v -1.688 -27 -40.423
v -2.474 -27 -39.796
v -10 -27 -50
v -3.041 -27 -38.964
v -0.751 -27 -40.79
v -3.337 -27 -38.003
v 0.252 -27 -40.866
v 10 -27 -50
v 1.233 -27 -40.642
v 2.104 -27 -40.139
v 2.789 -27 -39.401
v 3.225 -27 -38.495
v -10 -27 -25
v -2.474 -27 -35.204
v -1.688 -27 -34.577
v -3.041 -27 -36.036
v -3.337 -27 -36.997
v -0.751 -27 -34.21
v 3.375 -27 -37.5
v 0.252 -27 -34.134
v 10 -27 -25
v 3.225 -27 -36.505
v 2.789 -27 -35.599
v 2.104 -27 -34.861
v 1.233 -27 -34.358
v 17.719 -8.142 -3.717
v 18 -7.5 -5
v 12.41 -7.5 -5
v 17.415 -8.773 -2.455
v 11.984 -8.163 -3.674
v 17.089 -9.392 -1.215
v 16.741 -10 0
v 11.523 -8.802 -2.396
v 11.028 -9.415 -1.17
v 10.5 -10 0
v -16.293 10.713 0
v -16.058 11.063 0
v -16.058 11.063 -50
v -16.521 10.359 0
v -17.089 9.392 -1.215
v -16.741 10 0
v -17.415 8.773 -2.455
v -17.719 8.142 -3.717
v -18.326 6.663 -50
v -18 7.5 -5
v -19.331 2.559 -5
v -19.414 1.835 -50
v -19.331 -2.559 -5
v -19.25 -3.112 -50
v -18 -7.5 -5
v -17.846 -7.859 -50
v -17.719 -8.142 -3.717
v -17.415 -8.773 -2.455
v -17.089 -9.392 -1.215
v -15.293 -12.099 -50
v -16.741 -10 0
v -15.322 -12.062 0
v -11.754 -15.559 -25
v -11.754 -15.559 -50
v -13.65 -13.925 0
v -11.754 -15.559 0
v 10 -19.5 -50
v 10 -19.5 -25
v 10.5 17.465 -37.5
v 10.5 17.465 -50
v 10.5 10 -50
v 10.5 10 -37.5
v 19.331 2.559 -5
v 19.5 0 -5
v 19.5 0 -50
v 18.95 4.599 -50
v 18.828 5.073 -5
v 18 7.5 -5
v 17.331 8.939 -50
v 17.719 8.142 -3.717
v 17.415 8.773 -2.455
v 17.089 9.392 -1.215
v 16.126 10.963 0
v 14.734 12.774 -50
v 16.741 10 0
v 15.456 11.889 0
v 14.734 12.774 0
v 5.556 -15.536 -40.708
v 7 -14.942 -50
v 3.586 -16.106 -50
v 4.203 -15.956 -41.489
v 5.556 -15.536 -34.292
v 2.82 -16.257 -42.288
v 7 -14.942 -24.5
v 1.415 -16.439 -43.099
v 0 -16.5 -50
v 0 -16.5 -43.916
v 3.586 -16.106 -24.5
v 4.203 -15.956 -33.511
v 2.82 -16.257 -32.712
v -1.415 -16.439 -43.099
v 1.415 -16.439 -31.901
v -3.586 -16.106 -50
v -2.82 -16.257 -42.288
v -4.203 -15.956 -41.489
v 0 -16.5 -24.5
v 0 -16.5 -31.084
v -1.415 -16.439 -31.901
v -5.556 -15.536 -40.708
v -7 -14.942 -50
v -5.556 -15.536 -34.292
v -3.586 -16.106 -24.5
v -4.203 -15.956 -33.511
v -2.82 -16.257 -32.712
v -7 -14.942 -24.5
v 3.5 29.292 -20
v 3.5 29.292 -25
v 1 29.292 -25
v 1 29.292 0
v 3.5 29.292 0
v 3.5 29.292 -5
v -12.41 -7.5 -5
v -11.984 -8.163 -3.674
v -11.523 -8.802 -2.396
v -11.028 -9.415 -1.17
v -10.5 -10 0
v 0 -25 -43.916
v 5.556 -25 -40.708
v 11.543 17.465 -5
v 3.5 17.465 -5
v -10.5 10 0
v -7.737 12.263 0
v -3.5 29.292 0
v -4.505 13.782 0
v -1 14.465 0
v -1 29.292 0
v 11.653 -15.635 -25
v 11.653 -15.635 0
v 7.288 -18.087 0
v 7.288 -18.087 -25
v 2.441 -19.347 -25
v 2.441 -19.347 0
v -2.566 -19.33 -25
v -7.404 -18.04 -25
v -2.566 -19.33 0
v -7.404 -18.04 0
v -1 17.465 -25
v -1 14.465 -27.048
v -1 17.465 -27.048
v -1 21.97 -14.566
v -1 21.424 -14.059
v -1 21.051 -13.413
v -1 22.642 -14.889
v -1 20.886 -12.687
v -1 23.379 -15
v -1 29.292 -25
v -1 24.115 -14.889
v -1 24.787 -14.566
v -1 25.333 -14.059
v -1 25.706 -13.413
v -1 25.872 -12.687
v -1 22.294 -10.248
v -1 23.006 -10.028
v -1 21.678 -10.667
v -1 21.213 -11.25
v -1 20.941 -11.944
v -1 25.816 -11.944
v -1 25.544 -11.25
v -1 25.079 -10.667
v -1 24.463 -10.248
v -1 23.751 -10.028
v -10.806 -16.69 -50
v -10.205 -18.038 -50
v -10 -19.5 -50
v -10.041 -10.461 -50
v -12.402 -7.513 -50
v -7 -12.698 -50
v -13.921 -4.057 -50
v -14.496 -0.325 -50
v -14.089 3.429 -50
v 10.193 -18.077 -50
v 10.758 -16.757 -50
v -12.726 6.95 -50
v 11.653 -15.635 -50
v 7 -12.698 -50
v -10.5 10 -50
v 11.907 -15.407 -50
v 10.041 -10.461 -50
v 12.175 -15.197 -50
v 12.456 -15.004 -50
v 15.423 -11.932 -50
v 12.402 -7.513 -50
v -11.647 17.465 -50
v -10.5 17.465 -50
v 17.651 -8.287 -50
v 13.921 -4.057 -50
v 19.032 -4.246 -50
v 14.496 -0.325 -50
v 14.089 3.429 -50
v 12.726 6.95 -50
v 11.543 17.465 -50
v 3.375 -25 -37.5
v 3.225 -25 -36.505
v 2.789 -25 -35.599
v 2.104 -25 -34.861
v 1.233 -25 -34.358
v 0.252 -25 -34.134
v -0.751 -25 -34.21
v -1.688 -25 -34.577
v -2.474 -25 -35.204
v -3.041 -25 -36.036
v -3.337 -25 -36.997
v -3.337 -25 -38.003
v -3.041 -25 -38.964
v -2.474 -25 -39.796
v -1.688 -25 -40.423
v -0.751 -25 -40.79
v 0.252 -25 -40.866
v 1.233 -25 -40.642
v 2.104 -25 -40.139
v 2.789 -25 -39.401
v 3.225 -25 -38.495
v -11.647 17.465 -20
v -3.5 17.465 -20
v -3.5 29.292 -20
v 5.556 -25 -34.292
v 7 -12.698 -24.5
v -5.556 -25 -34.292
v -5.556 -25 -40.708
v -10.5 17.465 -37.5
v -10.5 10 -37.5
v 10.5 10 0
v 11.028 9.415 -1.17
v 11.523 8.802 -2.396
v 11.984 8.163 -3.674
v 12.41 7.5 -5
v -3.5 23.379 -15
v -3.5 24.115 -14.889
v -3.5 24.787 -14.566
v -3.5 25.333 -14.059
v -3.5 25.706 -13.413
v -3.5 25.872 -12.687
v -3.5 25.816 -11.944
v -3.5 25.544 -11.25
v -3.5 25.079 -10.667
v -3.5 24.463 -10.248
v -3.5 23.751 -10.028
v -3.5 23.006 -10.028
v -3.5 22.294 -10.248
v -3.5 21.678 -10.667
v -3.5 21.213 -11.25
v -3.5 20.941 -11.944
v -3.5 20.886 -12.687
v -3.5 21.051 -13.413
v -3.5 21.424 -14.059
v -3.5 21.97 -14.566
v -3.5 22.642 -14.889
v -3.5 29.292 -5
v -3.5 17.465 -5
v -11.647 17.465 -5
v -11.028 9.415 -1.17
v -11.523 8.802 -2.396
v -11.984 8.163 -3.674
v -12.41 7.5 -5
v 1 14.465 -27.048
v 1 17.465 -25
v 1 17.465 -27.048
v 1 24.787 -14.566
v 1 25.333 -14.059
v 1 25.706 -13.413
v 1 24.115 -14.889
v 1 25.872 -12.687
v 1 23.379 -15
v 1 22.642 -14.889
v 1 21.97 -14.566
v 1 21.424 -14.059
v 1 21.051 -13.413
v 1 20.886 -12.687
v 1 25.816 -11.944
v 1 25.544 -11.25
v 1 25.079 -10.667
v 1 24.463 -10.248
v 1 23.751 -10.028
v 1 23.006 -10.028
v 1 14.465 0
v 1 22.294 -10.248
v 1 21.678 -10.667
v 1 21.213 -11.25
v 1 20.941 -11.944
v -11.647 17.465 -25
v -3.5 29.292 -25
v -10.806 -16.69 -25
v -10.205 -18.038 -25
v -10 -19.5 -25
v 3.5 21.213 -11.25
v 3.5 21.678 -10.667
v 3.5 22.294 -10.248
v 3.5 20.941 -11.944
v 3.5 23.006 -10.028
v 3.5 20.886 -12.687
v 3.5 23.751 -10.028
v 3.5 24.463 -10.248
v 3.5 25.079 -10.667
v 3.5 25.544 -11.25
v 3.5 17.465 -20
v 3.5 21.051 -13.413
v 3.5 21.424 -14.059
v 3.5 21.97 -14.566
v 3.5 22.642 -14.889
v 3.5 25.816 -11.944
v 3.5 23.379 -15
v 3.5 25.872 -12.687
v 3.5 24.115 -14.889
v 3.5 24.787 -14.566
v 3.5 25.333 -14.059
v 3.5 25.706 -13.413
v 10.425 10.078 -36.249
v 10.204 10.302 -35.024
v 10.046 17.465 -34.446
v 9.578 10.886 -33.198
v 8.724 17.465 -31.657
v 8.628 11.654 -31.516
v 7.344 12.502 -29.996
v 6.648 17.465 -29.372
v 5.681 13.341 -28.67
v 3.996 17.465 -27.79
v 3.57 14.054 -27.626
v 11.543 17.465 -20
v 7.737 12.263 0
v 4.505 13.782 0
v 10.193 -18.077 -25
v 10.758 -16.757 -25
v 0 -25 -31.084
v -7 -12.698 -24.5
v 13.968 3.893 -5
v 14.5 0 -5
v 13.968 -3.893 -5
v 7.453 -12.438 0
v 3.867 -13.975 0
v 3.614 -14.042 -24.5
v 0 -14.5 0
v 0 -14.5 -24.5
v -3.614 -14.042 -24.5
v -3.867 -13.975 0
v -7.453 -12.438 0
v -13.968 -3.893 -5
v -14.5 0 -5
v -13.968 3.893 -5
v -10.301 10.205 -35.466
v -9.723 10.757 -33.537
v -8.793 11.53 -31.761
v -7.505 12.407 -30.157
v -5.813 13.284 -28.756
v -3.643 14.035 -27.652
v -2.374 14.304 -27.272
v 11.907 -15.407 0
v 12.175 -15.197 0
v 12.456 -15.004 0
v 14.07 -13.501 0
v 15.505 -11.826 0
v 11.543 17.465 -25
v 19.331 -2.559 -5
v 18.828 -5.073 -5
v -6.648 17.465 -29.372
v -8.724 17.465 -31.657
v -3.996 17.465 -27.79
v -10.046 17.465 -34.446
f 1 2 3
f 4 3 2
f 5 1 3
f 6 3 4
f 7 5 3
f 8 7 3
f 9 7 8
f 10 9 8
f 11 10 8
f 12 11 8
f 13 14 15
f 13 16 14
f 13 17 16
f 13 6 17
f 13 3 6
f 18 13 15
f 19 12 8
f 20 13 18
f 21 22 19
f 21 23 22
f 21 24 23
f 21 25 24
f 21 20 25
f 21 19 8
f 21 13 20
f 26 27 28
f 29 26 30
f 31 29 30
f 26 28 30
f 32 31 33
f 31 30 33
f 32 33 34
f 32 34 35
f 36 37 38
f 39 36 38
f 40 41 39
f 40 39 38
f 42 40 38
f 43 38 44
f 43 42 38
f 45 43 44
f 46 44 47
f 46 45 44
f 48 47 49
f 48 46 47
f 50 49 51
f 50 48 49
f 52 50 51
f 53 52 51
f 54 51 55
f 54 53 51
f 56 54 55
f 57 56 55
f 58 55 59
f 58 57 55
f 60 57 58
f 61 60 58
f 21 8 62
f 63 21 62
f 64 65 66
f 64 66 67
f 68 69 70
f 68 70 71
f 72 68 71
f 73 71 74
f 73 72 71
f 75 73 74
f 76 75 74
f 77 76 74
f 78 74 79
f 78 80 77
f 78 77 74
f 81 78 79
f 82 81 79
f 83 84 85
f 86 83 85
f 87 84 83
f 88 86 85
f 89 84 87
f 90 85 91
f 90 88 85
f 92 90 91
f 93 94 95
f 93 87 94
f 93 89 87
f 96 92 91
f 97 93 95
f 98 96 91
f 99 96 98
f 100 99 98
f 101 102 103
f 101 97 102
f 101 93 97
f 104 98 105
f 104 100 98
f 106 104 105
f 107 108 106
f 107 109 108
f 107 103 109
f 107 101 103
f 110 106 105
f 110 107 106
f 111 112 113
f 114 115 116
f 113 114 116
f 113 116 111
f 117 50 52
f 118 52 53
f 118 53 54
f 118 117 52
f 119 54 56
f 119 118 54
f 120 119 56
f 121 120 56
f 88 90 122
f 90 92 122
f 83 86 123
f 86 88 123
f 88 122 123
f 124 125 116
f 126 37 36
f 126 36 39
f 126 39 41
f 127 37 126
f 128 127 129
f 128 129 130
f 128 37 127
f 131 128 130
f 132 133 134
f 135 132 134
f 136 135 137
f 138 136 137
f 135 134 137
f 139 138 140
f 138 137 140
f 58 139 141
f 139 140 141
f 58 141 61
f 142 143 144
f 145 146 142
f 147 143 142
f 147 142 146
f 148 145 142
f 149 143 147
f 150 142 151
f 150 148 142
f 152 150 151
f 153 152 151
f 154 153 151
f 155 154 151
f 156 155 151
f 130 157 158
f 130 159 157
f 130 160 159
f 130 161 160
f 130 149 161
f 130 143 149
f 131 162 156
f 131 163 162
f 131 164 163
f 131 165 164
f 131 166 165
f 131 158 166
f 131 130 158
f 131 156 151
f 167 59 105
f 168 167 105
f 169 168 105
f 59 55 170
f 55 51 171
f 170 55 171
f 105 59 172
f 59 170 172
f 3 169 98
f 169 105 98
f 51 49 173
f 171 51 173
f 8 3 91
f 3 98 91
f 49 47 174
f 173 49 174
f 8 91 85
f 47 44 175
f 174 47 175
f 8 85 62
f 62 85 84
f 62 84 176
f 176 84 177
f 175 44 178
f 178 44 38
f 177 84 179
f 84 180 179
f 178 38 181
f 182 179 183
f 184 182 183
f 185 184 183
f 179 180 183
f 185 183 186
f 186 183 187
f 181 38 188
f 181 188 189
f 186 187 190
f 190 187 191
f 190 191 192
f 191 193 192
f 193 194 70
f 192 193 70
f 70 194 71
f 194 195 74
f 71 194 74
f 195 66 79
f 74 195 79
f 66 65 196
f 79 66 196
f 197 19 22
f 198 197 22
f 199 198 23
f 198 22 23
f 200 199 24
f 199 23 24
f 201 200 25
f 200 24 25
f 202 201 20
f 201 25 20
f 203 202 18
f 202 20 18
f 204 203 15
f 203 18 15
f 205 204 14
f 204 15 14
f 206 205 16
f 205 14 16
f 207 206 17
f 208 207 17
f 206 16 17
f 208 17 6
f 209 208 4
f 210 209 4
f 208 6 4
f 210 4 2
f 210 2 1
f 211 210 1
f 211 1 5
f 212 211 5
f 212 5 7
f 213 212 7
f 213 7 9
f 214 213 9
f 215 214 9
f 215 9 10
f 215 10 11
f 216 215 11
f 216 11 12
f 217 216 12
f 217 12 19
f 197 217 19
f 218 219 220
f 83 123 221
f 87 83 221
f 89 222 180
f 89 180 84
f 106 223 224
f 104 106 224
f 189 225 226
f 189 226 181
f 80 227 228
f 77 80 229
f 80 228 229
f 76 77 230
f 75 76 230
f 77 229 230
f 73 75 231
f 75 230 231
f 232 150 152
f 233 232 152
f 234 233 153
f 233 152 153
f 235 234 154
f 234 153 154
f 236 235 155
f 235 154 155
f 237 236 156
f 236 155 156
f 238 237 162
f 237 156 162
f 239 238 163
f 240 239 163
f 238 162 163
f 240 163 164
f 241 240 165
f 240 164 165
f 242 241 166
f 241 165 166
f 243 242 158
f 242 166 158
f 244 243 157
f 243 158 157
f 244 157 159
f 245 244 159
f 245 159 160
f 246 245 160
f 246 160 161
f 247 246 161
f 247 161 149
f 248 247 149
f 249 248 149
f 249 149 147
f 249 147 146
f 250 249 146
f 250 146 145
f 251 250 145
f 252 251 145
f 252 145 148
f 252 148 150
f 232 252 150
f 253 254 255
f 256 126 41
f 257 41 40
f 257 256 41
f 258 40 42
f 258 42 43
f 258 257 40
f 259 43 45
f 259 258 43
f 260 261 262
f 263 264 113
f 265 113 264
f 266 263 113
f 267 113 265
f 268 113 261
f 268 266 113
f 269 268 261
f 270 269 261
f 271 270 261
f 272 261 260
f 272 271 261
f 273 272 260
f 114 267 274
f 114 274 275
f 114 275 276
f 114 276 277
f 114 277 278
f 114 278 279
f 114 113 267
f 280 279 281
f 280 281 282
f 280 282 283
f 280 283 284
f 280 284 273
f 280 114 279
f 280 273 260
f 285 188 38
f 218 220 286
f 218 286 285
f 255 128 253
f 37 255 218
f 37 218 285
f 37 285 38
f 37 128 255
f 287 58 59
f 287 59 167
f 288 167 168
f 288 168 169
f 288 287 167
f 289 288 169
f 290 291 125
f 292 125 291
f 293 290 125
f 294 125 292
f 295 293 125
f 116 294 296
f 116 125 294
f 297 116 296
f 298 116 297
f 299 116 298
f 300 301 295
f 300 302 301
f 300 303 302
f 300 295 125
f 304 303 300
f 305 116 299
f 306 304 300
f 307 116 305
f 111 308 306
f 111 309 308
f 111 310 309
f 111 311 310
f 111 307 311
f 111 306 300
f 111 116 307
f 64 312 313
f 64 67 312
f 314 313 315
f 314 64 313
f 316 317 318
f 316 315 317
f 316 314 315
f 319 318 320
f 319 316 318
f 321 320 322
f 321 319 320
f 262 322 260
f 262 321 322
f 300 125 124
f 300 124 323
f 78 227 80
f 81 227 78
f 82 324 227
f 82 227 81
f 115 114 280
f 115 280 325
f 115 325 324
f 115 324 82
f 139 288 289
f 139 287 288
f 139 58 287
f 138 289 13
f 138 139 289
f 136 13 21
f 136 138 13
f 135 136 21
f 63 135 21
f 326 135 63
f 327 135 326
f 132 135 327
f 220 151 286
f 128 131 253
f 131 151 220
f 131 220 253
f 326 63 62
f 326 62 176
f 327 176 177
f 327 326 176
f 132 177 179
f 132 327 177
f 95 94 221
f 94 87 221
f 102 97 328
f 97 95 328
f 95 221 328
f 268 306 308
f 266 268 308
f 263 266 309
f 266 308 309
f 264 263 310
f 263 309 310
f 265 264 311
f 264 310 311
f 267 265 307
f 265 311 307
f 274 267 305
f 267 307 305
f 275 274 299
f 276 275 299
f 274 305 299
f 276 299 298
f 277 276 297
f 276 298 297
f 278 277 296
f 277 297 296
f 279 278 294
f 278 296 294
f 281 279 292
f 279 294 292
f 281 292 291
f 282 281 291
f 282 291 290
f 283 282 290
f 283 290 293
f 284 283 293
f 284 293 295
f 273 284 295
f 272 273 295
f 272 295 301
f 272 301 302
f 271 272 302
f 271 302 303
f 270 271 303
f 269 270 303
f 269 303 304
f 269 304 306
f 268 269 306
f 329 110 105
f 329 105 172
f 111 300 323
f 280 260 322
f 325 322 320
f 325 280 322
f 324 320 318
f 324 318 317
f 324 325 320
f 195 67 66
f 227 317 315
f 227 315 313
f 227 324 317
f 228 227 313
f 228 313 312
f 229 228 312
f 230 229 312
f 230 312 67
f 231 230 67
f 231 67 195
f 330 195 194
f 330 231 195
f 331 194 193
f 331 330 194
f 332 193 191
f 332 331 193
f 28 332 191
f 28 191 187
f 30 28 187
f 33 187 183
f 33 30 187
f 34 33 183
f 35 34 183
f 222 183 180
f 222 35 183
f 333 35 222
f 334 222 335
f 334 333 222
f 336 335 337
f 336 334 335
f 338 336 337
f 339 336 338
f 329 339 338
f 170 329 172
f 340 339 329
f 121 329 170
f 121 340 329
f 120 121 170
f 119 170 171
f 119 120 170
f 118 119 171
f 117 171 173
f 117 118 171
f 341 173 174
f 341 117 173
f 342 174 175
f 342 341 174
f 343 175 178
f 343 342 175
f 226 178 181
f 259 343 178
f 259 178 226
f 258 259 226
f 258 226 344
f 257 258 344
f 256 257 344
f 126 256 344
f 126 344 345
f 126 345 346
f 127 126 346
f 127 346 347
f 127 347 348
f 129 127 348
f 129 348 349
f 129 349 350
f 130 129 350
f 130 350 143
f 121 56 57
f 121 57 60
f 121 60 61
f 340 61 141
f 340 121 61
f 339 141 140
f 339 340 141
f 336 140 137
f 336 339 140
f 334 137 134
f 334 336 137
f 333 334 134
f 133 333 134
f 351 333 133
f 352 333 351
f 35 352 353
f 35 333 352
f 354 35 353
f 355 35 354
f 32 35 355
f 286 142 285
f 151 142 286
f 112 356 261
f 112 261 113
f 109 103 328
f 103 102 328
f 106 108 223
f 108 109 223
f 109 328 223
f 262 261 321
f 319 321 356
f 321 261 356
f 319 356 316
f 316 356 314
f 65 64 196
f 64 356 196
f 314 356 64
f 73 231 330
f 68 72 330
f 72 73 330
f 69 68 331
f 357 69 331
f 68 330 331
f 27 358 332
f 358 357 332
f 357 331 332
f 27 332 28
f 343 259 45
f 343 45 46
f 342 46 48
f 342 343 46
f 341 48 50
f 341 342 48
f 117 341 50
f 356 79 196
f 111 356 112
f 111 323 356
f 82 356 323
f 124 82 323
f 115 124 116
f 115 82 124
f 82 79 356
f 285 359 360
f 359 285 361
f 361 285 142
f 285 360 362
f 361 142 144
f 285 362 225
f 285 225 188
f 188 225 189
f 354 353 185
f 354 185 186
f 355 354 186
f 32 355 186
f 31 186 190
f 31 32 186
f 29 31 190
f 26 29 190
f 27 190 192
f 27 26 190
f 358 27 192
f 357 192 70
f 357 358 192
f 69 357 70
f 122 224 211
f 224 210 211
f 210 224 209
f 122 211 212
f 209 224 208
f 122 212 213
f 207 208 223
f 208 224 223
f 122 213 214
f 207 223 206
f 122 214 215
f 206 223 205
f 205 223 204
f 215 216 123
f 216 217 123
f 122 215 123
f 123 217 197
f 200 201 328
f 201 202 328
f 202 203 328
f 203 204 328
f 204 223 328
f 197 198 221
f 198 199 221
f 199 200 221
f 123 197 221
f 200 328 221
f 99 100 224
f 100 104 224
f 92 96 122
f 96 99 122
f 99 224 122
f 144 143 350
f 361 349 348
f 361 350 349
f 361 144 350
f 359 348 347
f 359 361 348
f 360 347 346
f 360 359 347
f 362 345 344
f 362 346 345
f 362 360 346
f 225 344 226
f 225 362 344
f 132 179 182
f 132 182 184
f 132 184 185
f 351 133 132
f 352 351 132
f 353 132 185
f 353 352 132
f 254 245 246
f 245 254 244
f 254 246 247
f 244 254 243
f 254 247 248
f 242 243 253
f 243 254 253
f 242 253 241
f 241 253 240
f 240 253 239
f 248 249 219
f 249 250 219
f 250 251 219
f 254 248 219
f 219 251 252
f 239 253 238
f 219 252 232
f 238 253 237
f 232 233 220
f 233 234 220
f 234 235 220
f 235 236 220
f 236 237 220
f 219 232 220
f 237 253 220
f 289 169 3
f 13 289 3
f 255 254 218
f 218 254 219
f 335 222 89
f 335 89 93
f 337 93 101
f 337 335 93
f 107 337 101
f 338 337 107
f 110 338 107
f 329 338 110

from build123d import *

# Parameters (mm, degrees)
BOSS_EXTRUDE1_DEPTH            = 50
SKETCH4_W                      = 15
SKETCH4_H                      = 11.826160891
CUT_EXTRUDE3_DEPTH             = 17
SKETCH5_R                      = 2.5
CUT_EXTRUDE4_DEPTH             = 17
CUT_EXTRUDE4_DEPTH_BACK        = 24
SKETCH9_W                      = 25
SKETCH9_H                      = 11.826160891
CUT_EXTRUDE8_DEPTH             = 17
CUT_EXTRUDE8_DEPTH_BACK        = 24
CUT_EXTRUDE9_REACH             = 44
CUT_EXTRUDE9_DIRECTION_2_REACH = 16.792
CUT_EXTRUDE10_DEPTH            = 13
CUT_EXTRUDE10_DEPTH_BACK       = 13.5000001
CUT_EXTRUDE11_DEPTH            = 20.5
CUT_EXTRUDE11_DEPTH_BACK       = 20.5
CUT_EXTRUDE15_REACH            = 58.792
SKETCH14_R                     = 3.375
BOSS_EXTRUDE2_DEPTH            = 2.5
CUT_EXTRUDE17_DEPTH            = 25
SKETCH16_W                     = 20
SKETCH16_H                     = 25
CUT_EXTRUDE18_DEPTH            = 0.5


with BuildPart() as part:
    # Sketch1 → Boss-Extrude1 (new body)
    with BuildSketch(Plane.XY):
        with BuildLine():
            Line((3.5, 29.291637032), (1, 29.291637032))
            Line((1, 29.291637032), (1, 14.465476141))
            ThreePointArc((1, 14.465476141), (0, -14.5), (-1, 14.465476141))
            Line((-1, 14.465476141), (-1, 29.291637032))
            Line((-1, 29.291637032), (-3.5, 29.291637032))
            Line((-3.5, 29.291637032), (-16.058186159, 11.06275993))
            ThreePointArc((-16.058186159, 11.06275993), (-19.250030671, -3.112285199), (-11.754006256, -15.559348859))
            ThreePointArc((-11.754006256, -15.559348859), (-6.198495674, -18.488608692), (0, -19.5))
            ThreePointArc((0, -19.5), (6.13886546, -18.508493479), (11.653451419, -15.634803166))
            ThreePointArc((11.653451419, -15.634803166), (12.039474024, -15.299956246), (12.455712019, -15.003507527))
            ThreePointArc((12.455712019, -15.003507527), (17.651294349, -8.287448812), (19.5, 0))
            ThreePointArc((19.5, 0), (18.269595128, 6.817029694), (14.733651913, 12.773781793))
            Line((14.733651913, 12.773781793), (3.5, 29.291637032))
        make_face()
        with BuildLine():
            ThreePointArc((10, -19.5), (10.430719001, -17.397998087), (11.653451419, -15.634803166))
            ThreePointArc((11.653451419, -15.634803166), (6.13886546, -18.508493479), (0, -19.5))
            ThreePointArc((0, -19.5), (-6.198495674, -18.488608692), (-11.754006256, -15.559348859))
            ThreePointArc((-11.754006256, -15.559348859), (-10.458303194, -17.343308705), (-10, -19.5))
            Line((-10, -19.5), (-10, -27.5))
            Line((-10, -27.5), (10, -27.5))
            Line((10, -27.5), (10, -19.5))
        make_face()
    extrude(amount=-BOSS_EXTRUDE1_DEPTH)

    # Sketch4 → Cut-Extrude3 (cut, through all)
    with BuildSketch(Plane(origin=(3.5, 0, 0), x_dir=(0, 0, -1), z_dir=(1, 0, 0))):
        with Locations((12.5, 23.378556587)):
            Rectangle(SKETCH4_W, SKETCH4_H)
    cut_extrude3 = extrude(amount=CUT_EXTRUDE3_DEPTH, mode=Mode.SUBTRACT)

    # Mirror1: Cut-Extrude3 across plane
    add(cut_extrude3.mirror(Plane(origin=(0, 0, 0), x_dir=(0, 0, 1), z_dir=(1, 0, 0))), mode=Mode.SUBTRACT)

    # Sketch5 → Cut-Extrude4 (cut, two sides)
    with BuildSketch(Plane(origin=(3.5, 0, 0), x_dir=(0, 0, -1), z_dir=(1, 0, 0))) as cut_extrude4_sk:
        with Locations((12.5, 23.378556587)):
            Circle(SKETCH5_R)
    extrude(amount=CUT_EXTRUDE4_DEPTH, mode=Mode.SUBTRACT)
    extrude(cut_extrude4_sk.sketch, amount=-CUT_EXTRUDE4_DEPTH_BACK, mode=Mode.SUBTRACT)

    # Sketch9 → Cut-Extrude8 (cut, two sides)
    with BuildSketch(Plane(origin=(3.5, 0, 0), x_dir=(0, 0, -1), z_dir=(1, 0, 0))) as cut_extrude8_sk:
        with Locations((37.5, 23.378556587)):
            Rectangle(SKETCH9_W, SKETCH9_H)
    extrude(amount=CUT_EXTRUDE8_DEPTH, mode=Mode.SUBTRACT)
    extrude(cut_extrude8_sk.sketch, amount=-CUT_EXTRUDE8_DEPTH_BACK, mode=Mode.SUBTRACT)

    # Sketch8 → Cut-Extrude9 (cut, up to next)
    with BuildSketch(Plane(origin=(0, 14.5, 0), x_dir=(1, 0, 0), z_dir=(0, 1, 0)), mode=Mode.PRIVATE) as cut_extrude9_sk1:
        with BuildLine():
            Line((-10.5, 37.5), (-10.5, 50))
            Line((-10.5, 50), (-1, 50))
            Line((-1, 50), (-1, 27.04772752))
            ThreePointArc((-1, 27.04772752), (-7.770135134, 30.437776554), (-10.5, 37.5))
        make_face()
    cut_extrude9_tool1 = extrude(cut_extrude9_sk1.sketch, amount=-CUT_EXTRUDE9_REACH, mode=Mode.PRIVATE) & part.part
    add(cut_extrude9_tool1.solids().sort_by_distance((-5.457616, 14.5, -39.610639))[0], mode=Mode.SUBTRACT)
    # Sketch8 → Cut-Extrude9 (cut, up to next)
    with BuildSketch(Plane(origin=(0, 14.5, 0), x_dir=(1, 0, 0), z_dir=(0, 1, 0)), mode=Mode.PRIVATE) as cut_extrude9_sk2:
        with BuildLine():
            Line((10.5, 50), (10.5, 37.5))
            ThreePointArc((10.5, 37.5), (7.770135134, 30.437776554), (1, 27.04772752))
            Line((1, 27.04772752), (1, 50))
            Line((1, 50), (10.5, 50))
        make_face()
    cut_extrude9_tool2 = extrude(cut_extrude9_sk2.sketch, amount=-CUT_EXTRUDE9_REACH, mode=Mode.PRIVATE) & part.part
    add(cut_extrude9_tool2.solids().sort_by_distance((5.457616, 14.5, -39.610639))[0], mode=Mode.SUBTRACT)

    # Sketch8 → Cut-Extrude9 direction 2 (cut, up to next)
    with BuildSketch(Plane(origin=(0, 14.5, 0), x_dir=(1, 0, 0), z_dir=(0, 1, 0)), mode=Mode.PRIVATE) as cut_extrude9_direction_2_sk1:
        with BuildLine():
            Line((-10.5, 37.5), (-10.5, 50))
            Line((-10.5, 50), (-1, 50))
            Line((-1, 50), (-1, 27.04772752))
            ThreePointArc((-1, 27.04772752), (-7.770135134, 30.437776554), (-10.5, 37.5))
        make_face()
    cut_extrude9_direction_2_tool1 = extrude(cut_extrude9_direction_2_sk1.sketch, amount=CUT_EXTRUDE9_DIRECTION_2_REACH, mode=Mode.PRIVATE) & part.part
    add(cut_extrude9_direction_2_tool1.solids().sort_by_distance((-5.457616, 14.5, -39.610639))[0], mode=Mode.SUBTRACT)
    # Sketch8 → Cut-Extrude9 direction 2 (cut, up to next)
    with BuildSketch(Plane(origin=(0, 14.5, 0), x_dir=(1, 0, 0), z_dir=(0, 1, 0)), mode=Mode.PRIVATE) as cut_extrude9_direction_2_sk2:
        with BuildLine():
            Line((10.5, 50), (10.5, 37.5))
            ThreePointArc((10.5, 37.5), (7.770135134, 30.437776554), (1, 27.04772752))
            Line((1, 27.04772752), (1, 50))
            Line((1, 50), (10.5, 50))
        make_face()
    cut_extrude9_direction_2_tool2 = extrude(cut_extrude9_direction_2_sk2.sketch, amount=CUT_EXTRUDE9_DIRECTION_2_REACH, mode=Mode.PRIVATE) & part.part
    add(cut_extrude9_direction_2_tool2.solids().sort_by_distance((5.457616, 14.5, -39.610639))[0], mode=Mode.SUBTRACT)

    # Sketch10 → Cut-Extrude10 (cut, two sides)
    with BuildSketch(Plane.XY.offset(-37.5)) as cut_extrude10_sk:
        with BuildLine():
            Line((-7, -12.698425099), (7, -12.698425099))
            Line((7, -12.698425099), (7, -14.941552797))
            ThreePointArc((7, -14.941552797), (0, -16.5), (-7, -14.941552797))
            Line((-7, -14.941552797), (-7, -12.698425099))
        make_face()
    extrude(amount=CUT_EXTRUDE10_DEPTH, mode=Mode.SUBTRACT)
    extrude(cut_extrude10_sk.sketch, amount=-CUT_EXTRUDE10_DEPTH_BACK, mode=Mode.SUBTRACT)

    # Sketch11 → Cut-Extrude11 (cut, two sides)
    with BuildSketch(Plane(origin=(0, 0, 0), x_dir=(0, 0, -1), z_dir=(1, 0, 0))) as cut_extrude11_sk:
        Polygon((5, -7.5), (0, -10), (0, 10), (5, 7.5), align=None)
    extrude(amount=CUT_EXTRUDE11_DEPTH, mode=Mode.SUBTRACT)
    extrude(cut_extrude11_sk.sketch, amount=-CUT_EXTRUDE11_DEPTH_BACK, mode=Mode.SUBTRACT)

    # Sketch13 → Cut-Extrude15 (cut, up to next)
    with BuildSketch(Plane.XZ.offset(27.5), mode=Mode.PRIVATE) as cut_extrude15_sk1:
        Polygon((0, -31.084195134), (-5.55625, -34.292097567), (-5.55625, -40.707902433), (0, -43.915804866), (5.55625, -40.707902433), (5.55625, -34.292097567), align=None)
    cut_extrude15_tool1 = extrude(cut_extrude15_sk1.sketch, amount=-CUT_EXTRUDE15_REACH, mode=Mode.PRIVATE) & part.part
    add(cut_extrude15_tool1.solids().sort_by_distance((0, -27.5, -37.5))[0], mode=Mode.SUBTRACT)

    # Sketch14 → Boss-Extrude2 (add)
    with BuildSketch(Plane.XZ.offset(27.5)):
        Polygon((5.55625, -40.707902433), (5.55625, -34.292097567), (0, -31.084195134), (-5.55625, -34.292097567), (-5.55625, -40.707902433), (0, -43.915804866), align=None)
        with Locations((0, -37.5)):
            Circle(SKETCH14_R, mode=Mode.SUBTRACT)
    extrude(amount=-BOSS_EXTRUDE2_DEPTH)

    # Sketch15 → Cut-Extrude17 (cut)
    with BuildSketch(Plane.XY):
        with BuildLine():
            Line((-19.5, 0), (-19.5, -27.5))
            Line((-19.5, -27.5), (19.5, -27.5))
            Line((19.5, -27.5), (19.5, 0))
            ThreePointArc((19.5, 0), (0, -19.5), (-19.5, 0))
        make_face()
    extrude(amount=-CUT_EXTRUDE17_DEPTH, mode=Mode.SUBTRACT)

    # Sketch16 → Cut-Extrude18 (cut)
    with BuildSketch(Plane.XZ.offset(27.5)):
        with Locations((0, -37.5)):
            Rectangle(SKETCH16_W, SKETCH16_H)
    extrude(amount=-CUT_EXTRUDE18_DEPTH, mode=Mode.SUBTRACT)


solid = part.part
